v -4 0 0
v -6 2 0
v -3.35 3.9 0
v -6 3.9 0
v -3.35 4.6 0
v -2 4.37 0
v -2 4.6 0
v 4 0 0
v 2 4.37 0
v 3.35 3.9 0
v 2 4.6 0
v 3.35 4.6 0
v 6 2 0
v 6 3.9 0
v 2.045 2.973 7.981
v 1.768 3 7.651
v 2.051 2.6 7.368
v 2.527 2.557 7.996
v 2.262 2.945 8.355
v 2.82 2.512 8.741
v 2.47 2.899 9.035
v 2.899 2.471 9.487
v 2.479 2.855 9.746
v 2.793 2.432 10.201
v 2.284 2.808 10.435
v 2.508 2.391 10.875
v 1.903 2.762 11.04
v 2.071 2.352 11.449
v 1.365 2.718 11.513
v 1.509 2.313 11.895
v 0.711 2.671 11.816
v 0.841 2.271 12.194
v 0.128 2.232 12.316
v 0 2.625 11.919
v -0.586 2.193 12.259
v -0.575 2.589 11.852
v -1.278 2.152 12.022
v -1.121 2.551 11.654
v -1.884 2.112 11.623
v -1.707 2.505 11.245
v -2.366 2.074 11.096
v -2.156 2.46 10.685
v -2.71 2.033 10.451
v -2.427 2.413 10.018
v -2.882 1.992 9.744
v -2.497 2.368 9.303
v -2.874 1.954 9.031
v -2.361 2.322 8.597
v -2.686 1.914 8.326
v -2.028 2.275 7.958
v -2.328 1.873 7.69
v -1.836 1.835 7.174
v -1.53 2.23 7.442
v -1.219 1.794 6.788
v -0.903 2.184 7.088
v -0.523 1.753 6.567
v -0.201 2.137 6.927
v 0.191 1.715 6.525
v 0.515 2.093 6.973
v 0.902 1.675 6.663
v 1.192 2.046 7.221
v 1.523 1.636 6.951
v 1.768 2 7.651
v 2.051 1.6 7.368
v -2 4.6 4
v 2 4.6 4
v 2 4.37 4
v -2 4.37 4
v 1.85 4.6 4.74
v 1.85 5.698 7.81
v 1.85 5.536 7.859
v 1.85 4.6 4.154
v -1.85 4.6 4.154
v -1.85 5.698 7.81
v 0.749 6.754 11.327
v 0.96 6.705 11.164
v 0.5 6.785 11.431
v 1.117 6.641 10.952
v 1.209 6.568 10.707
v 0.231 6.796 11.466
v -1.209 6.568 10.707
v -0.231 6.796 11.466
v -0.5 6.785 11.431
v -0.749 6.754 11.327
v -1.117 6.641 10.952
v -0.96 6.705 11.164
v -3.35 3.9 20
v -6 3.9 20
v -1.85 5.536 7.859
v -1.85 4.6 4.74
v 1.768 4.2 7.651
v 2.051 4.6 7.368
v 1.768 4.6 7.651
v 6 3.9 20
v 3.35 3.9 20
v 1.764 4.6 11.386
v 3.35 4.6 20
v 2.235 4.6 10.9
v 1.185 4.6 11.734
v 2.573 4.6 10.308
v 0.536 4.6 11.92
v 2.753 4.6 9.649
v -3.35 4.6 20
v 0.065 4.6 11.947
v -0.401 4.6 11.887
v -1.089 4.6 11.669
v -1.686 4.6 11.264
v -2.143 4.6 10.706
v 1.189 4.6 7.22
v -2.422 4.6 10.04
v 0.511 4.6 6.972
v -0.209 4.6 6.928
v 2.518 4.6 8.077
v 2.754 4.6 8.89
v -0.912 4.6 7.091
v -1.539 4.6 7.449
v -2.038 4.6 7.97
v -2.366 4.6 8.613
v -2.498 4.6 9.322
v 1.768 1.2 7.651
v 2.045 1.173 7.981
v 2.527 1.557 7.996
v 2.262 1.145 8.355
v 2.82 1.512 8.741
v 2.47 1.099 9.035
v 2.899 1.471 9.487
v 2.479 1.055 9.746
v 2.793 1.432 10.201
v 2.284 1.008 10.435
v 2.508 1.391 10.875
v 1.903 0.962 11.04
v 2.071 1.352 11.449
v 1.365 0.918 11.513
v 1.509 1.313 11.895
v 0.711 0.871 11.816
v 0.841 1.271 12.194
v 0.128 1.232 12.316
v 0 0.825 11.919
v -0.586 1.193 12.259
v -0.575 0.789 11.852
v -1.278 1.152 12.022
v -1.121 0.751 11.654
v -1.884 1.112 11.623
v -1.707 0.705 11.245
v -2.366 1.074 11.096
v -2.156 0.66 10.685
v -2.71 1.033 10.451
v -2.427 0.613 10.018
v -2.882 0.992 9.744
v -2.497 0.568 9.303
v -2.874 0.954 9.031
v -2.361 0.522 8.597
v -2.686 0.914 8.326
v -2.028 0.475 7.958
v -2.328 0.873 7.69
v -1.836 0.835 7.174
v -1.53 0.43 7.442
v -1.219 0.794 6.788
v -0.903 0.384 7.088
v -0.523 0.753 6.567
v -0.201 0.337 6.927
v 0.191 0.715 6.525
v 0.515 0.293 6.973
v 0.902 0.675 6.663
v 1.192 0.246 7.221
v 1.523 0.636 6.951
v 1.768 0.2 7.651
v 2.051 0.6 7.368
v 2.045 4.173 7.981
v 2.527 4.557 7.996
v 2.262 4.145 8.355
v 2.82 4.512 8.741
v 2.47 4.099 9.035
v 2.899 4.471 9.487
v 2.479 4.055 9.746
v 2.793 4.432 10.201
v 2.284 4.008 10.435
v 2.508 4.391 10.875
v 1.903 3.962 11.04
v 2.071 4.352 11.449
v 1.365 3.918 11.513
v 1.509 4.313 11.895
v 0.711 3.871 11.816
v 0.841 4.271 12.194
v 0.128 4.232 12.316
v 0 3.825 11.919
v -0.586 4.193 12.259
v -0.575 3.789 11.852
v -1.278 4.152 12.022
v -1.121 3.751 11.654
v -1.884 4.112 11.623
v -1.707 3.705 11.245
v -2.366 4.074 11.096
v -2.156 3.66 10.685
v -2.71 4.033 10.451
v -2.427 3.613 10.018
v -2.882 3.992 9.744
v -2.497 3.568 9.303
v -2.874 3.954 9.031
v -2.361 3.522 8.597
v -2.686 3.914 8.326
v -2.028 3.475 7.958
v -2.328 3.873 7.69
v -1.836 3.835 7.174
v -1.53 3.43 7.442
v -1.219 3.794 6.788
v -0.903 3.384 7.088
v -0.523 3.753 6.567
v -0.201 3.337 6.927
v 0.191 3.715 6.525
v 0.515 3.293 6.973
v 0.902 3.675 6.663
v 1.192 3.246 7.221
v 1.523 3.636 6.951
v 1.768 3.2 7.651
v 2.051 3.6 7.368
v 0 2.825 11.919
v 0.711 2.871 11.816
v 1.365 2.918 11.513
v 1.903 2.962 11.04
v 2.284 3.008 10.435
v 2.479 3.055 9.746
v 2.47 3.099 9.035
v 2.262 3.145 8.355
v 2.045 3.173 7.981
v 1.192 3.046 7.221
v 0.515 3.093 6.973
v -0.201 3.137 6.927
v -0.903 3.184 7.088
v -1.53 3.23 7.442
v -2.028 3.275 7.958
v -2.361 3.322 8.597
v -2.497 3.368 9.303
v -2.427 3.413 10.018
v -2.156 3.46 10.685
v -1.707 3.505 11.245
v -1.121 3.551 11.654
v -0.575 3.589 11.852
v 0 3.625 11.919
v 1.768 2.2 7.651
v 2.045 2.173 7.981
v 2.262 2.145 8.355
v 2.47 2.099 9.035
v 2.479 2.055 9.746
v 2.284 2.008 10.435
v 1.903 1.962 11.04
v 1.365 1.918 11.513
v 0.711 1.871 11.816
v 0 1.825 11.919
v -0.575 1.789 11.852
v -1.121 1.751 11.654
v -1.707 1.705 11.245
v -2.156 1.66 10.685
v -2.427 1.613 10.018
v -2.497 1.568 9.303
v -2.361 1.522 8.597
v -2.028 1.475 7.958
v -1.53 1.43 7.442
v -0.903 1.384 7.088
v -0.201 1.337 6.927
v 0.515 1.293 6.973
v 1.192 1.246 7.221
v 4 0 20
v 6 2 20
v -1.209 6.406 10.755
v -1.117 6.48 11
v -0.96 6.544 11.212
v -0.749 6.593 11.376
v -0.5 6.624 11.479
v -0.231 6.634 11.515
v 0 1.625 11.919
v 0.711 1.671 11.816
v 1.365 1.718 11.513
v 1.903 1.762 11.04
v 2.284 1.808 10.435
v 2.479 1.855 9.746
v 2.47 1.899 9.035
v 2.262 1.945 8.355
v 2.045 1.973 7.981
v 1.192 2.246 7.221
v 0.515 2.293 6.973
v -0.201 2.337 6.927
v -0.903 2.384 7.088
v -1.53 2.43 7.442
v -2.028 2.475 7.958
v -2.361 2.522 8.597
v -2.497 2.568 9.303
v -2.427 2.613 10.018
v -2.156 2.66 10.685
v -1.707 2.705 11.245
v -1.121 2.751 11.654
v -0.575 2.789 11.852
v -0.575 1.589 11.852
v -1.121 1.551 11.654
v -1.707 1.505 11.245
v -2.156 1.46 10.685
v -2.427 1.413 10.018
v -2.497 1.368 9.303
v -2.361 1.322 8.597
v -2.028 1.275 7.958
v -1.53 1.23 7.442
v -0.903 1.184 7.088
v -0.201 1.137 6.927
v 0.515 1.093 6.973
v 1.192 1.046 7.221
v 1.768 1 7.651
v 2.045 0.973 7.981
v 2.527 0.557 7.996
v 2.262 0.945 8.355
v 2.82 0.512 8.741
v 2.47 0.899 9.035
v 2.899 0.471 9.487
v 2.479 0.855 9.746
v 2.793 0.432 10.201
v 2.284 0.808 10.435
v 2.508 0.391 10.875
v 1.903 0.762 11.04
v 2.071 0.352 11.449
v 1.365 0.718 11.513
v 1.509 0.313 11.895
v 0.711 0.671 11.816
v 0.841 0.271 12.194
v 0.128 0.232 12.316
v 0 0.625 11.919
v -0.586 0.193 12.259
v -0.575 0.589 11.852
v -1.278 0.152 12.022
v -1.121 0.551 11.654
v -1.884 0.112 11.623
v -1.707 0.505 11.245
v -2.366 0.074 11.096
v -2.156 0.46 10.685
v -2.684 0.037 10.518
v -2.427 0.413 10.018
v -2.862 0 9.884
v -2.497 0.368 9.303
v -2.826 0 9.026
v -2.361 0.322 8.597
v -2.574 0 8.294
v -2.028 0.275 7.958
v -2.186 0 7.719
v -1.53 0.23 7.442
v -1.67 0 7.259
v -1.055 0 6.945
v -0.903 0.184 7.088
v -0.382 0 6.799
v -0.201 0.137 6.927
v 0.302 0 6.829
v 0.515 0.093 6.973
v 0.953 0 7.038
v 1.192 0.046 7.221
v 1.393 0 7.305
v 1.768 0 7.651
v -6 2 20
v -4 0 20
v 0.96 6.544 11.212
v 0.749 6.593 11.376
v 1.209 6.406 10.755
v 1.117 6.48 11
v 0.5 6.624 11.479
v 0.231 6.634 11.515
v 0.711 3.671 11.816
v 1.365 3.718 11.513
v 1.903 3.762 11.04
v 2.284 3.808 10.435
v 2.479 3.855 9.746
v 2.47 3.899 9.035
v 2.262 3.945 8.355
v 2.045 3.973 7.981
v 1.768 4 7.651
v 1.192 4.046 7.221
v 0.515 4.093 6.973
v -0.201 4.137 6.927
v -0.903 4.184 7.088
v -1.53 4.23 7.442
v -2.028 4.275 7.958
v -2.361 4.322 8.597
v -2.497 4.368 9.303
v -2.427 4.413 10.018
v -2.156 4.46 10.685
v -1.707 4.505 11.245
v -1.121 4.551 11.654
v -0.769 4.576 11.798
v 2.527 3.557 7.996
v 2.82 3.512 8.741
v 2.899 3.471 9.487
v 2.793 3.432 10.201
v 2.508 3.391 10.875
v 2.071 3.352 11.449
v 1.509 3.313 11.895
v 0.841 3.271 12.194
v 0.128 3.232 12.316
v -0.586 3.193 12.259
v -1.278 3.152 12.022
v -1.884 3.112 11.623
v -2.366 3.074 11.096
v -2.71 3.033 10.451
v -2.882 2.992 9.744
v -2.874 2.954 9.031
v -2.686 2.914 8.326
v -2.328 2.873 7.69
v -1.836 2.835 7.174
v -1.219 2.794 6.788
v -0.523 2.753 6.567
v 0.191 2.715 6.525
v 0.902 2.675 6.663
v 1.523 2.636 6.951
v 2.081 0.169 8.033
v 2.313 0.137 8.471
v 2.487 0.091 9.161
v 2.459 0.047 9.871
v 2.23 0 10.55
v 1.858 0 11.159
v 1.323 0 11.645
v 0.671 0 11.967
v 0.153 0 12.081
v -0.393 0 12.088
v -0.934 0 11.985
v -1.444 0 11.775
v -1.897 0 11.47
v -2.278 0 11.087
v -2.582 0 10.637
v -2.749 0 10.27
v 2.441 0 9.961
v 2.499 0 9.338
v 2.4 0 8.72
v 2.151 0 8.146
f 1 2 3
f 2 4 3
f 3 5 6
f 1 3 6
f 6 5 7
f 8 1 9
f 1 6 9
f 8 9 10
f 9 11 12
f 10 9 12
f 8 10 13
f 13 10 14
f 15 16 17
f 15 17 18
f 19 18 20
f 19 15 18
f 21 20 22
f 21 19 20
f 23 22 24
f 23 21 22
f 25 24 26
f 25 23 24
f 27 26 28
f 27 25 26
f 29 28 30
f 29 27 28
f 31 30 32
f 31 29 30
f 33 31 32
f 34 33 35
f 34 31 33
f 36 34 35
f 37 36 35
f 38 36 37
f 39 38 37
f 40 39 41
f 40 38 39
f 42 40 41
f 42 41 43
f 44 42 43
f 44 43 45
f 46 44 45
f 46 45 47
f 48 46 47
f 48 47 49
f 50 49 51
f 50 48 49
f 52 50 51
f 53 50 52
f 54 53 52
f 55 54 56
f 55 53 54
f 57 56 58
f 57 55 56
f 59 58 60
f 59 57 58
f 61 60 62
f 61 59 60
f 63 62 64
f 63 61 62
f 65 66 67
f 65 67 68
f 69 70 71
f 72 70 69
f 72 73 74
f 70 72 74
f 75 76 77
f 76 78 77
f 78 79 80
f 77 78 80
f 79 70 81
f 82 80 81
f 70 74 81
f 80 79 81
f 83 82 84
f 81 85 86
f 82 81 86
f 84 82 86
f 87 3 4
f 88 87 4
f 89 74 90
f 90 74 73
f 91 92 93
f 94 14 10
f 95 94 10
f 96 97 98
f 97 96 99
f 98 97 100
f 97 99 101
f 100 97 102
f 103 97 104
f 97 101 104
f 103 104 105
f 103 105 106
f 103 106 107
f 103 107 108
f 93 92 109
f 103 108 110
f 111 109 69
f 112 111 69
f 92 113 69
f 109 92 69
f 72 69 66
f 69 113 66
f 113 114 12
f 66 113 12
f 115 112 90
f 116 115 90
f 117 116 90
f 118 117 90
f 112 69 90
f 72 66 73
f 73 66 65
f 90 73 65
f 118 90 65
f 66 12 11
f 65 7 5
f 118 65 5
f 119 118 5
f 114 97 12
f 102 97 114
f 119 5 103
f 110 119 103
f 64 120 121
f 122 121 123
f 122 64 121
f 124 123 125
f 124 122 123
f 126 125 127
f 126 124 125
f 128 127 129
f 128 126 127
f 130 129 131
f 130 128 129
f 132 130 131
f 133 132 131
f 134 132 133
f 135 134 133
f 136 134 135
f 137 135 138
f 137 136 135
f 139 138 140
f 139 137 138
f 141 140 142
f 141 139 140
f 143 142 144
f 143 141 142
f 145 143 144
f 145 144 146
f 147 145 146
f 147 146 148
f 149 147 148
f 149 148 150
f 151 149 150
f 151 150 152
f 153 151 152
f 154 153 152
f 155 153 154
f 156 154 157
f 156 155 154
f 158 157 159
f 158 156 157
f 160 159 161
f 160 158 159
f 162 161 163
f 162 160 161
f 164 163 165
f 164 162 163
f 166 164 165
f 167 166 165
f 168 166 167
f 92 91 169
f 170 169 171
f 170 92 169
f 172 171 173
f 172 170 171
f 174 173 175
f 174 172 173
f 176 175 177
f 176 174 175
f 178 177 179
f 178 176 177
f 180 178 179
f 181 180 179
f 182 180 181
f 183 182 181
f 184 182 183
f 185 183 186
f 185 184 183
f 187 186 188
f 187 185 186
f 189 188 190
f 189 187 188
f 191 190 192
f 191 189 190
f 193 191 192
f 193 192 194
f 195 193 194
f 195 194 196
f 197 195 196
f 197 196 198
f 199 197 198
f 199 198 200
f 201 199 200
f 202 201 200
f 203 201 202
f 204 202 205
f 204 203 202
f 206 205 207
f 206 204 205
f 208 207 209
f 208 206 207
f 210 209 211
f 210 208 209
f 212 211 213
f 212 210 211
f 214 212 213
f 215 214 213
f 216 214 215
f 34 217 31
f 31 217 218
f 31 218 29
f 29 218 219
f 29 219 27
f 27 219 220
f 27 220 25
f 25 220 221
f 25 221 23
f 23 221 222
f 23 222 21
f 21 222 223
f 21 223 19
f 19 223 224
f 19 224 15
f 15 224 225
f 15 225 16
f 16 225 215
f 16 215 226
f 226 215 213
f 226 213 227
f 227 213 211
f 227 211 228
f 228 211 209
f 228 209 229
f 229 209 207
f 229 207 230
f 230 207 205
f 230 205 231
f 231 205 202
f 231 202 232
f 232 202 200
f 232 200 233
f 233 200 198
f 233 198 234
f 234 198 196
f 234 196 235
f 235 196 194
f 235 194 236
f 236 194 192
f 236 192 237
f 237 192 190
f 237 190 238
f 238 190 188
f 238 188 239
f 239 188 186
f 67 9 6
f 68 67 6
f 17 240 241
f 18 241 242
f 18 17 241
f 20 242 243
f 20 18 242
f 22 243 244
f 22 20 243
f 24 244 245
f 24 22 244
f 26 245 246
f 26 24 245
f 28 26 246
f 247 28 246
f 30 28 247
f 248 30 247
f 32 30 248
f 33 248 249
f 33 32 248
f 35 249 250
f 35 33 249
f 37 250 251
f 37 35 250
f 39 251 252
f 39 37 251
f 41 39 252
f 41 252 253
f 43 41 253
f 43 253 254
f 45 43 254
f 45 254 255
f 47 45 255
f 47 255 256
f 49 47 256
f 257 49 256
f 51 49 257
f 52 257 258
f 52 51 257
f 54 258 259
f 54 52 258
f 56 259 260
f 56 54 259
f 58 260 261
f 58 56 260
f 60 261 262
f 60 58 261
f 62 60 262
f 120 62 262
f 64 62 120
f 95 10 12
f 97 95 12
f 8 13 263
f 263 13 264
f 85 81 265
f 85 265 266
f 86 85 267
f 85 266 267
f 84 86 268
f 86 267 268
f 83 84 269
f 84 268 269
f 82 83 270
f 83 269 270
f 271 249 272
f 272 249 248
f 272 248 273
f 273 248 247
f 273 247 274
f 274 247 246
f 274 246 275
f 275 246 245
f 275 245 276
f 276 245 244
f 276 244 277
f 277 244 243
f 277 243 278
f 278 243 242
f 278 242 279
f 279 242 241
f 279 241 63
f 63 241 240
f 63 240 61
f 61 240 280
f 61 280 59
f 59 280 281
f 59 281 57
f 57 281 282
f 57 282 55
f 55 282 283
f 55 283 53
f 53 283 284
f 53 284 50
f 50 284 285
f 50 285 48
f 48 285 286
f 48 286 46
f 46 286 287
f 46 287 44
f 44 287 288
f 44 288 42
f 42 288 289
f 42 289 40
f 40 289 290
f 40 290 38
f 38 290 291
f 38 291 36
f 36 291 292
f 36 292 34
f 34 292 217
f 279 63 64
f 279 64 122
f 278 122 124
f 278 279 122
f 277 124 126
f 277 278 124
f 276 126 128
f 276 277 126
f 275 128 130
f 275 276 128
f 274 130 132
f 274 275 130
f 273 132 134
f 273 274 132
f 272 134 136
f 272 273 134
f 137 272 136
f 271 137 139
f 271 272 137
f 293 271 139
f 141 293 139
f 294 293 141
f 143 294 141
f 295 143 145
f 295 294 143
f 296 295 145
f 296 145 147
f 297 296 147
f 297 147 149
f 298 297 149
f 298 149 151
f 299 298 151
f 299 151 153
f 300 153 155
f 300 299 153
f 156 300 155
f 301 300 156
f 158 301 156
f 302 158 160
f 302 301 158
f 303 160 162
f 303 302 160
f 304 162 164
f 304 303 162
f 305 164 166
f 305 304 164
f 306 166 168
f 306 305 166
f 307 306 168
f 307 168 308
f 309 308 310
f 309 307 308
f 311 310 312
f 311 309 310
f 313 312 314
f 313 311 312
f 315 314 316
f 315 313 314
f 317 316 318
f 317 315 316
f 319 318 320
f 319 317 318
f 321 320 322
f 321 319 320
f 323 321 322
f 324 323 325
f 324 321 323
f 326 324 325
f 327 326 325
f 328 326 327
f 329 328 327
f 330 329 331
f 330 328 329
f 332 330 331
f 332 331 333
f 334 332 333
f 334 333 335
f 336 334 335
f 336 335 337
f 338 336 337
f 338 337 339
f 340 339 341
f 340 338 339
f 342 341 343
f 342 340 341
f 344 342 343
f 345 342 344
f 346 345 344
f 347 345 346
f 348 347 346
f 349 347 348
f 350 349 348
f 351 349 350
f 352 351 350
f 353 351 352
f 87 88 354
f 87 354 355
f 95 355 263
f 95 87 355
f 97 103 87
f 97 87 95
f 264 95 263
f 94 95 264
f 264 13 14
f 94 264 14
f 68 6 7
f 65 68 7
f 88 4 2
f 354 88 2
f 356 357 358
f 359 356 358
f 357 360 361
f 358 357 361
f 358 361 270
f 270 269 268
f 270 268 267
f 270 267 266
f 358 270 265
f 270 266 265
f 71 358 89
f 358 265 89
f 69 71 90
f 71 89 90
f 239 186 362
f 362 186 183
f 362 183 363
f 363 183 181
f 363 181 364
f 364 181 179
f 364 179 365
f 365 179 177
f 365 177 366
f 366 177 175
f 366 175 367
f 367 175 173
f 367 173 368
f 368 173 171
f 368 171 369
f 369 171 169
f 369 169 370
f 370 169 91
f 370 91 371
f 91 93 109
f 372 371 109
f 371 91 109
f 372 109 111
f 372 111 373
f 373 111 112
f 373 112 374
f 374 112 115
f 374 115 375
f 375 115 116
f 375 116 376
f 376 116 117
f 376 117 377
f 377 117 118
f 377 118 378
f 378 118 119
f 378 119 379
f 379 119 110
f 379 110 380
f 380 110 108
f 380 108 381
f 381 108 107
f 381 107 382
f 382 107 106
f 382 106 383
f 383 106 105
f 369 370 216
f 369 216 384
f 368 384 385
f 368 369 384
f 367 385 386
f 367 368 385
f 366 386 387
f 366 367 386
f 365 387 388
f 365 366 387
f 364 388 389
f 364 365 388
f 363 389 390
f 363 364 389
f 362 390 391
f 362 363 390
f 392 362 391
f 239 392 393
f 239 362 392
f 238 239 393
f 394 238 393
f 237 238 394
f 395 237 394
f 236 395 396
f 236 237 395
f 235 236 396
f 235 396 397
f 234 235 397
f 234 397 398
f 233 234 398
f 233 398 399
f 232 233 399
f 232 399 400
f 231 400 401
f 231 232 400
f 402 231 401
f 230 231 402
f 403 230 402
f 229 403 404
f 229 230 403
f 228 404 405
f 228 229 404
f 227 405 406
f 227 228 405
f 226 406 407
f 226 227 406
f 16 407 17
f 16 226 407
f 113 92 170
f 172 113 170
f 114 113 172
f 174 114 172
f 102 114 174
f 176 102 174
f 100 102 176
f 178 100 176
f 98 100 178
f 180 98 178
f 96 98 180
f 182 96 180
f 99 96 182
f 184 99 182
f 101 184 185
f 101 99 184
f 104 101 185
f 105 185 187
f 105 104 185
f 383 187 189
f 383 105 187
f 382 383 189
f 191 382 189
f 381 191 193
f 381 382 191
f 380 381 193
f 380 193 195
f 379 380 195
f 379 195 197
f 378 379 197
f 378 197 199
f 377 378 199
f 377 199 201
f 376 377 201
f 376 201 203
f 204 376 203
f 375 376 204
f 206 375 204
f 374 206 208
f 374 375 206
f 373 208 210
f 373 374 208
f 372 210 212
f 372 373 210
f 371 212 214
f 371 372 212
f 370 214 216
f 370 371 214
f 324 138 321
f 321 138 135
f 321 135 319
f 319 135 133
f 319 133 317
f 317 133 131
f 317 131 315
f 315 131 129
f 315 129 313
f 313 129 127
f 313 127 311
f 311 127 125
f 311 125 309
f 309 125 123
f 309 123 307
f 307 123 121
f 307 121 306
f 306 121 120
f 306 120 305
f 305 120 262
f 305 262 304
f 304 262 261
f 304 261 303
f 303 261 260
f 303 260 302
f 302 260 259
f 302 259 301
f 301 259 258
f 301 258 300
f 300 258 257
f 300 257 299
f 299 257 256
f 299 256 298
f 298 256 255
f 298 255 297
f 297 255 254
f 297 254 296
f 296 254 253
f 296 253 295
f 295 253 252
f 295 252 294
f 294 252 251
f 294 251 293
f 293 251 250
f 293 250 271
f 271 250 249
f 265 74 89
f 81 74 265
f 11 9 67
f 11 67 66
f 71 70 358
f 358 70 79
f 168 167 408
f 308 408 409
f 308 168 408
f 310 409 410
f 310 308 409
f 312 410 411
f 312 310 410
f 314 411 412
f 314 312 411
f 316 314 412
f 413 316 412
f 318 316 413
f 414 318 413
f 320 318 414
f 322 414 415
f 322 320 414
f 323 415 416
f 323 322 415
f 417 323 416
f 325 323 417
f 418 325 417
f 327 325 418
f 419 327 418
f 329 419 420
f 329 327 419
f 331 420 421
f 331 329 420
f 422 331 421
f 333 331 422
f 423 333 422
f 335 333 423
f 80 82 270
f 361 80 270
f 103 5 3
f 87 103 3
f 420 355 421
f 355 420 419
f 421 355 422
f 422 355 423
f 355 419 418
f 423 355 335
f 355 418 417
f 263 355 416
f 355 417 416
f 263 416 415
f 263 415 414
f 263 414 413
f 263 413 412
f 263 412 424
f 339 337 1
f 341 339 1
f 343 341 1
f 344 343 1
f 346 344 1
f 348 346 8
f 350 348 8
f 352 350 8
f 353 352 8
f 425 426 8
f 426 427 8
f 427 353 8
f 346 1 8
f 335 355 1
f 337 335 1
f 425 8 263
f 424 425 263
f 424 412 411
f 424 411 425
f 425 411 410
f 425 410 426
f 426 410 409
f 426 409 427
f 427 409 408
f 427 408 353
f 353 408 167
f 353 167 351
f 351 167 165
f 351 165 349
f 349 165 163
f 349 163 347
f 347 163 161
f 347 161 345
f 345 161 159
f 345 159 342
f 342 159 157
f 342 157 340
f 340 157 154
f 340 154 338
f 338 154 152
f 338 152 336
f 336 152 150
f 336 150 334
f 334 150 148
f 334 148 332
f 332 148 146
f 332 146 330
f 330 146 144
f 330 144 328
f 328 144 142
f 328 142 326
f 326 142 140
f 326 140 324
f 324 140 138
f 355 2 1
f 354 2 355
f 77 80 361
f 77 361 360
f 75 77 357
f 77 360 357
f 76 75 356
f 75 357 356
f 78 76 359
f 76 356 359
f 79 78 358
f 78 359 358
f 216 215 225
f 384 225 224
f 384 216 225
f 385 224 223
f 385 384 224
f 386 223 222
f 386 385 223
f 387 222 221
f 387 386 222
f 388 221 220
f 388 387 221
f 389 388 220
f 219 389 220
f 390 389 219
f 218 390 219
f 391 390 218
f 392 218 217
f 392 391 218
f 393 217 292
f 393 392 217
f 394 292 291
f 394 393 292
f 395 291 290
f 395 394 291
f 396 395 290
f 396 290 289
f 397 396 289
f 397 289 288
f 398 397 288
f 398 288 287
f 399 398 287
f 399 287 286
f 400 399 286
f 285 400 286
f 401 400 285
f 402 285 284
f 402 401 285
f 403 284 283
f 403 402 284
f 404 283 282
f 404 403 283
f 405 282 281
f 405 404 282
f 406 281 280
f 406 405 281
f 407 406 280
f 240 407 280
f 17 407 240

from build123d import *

# Parameters (mm, degrees)
EXTRUDE_1_DEPTH      = 20
CHAMFER_1_SIZE       = 2
SKETCH_2_R           = 2.5
CUT_EXTRUDE_1_DEPTH  = 22.381300241
SWEEP_1_PITCH        = 1
SKETCH_6_W           = 4
SKETCH_6_H           = 0.46098281
CUT_EXTRUDE_2_DEPTH  = 4
EXTRUDE_2_DEPTH      = 1.85
EXTRUDE_2_DEPTH_BACK = 1.85
CUT_EXTRUDE_3_DEPTH  = 1.85
FILLET_1_R           = 1


with BuildPart() as part:
    # 草图1 → 凸台-拉伸1 (new body)
    with BuildSketch(Plane.XY):
        Polygon((-6, 0), (6, 0), (6, 3.9), (3.35, 3.9), (3.35, 4.6), (-3.35, 4.6), (-3.35, 3.9), (-6, 3.9), align=None)
    extrude(amount=EXTRUDE_1_DEPTH)

    # 倒角1
    chamfer_1_edges = [part.edges().sort_by_distance(p)[0] for p in [
        (6, 0, 10),
        (-6, 0, 10),
    ]]
    chamfer(chamfer_1_edges, length=CHAMFER_1_SIZE)

    # 草图2 → 切除-拉伸1 (cut, through all)
    with BuildSketch(Plane(origin=(0, 4.6, 0), x_dir=(1, 0, 0), z_dir=(0, 1, 0))):
        with Locations(Location((0, -9.419001614, 0), (0, 0, 270))):
            Circle(SKETCH_2_R)
    extrude(amount=-CUT_EXTRUDE_1_DEPTH, mode=Mode.SUBTRACT)

    # 切除-扫描1: arcs per turn and ends read off the stored shape
    # 切除-扫描1: the profile of 草图5 profile screwed along a right-hand helix through 5 turns, 8 arcs to a turn; built about Z, then put on its axis
    sweep_1_z = Axis((0, 0, 0), (0, 0, 1))
    sweep_1_corners = [(2.4997, 0, -0.4003), (2.4997, 0, 0.4003), (2.9, 0, 0)]
    with BuildLine(mode=Mode.PRIVATE) as sweep_1_profile:
        Line(sweep_1_corners[0], sweep_1_corners[1])
        Line(sweep_1_corners[1], sweep_1_corners[2])
        Line(sweep_1_corners[2], sweep_1_corners[0])
    sweep_1_cap = Face(sweep_1_profile.wire())
    sweep_1_turn_angles = [0, 22.5, 45, 67.5, 90, 112.5, 135, 157.5, 180, 202.5, 225, 247.5, 270, 292.5, 315, 337.5, 360]
    sweep_1_turn_weights = [1, 0.9238795325112867, 1, 0.9238795325112867, 1, 0.9238795325112867, 1, 0.9238795325112867, 1, 0.9238795325112867, 1, 0.9238795325112867, 1, 0.9238795325112867, 1, 0.9238795325112867, 1]
    sweep_1_turn_rails = [Edge.make_bspline([Vector(p[0], p[1], 0).rotate(sweep_1_z, sweep_1_turn_angles[k]) / sweep_1_turn_weights[k] + Vector(0, 0, p[2] + SWEEP_1_PITCH * sweep_1_turn_angles[k] / 360) for k in range(17)], [0, 0, 0, 1, 1, 2, 2, 3, 3, 4, 4, 5, 5, 6, 6, 7, 7, 8, 8, 8], 2, sweep_1_turn_weights) for p in sweep_1_corners]
    sweep_1_turn_sides = [Face.make_surface_from_curves(sweep_1_turn_rails[p[0]], sweep_1_turn_rails[p[1]]) for p in [(0, 1), (1, 2), (2, 0)]]
    sweep_1 = Plane(origin=(0, 4.6, 9.419001614), x_dir=(0.7071067811865438, 0, -0.7071067811865513), z_dir=(0, -1, 0)) * Solid(Shell([*[p.moved(Location((0, 0, SWEEP_1_PITCH * i))) for i in range(5) for p in sweep_1_turn_sides], sweep_1_cap, sweep_1_cap.rotate(sweep_1_z, 1800).moved(Location((0, 0, SWEEP_1_PITCH * 1800 / 360)))]))
    add(sweep_1, mode=Mode.SUBTRACT)

    # 草图6 → 切除-拉伸2 (cut)
    with BuildSketch(Plane(origin=(0, 0, 0), x_dir=(-1, 0, 0), z_dir=(0, 0, -1))):
        with Locations((0, 4.6)):
            Rectangle(SKETCH_6_W, SKETCH_6_H)
    extrude(amount=-CUT_EXTRUDE_2_DEPTH, mode=Mode.SUBTRACT)

    # 草图7 → 凸台-拉伸2 (add, two sides: drawn at the far end of the back side and taken through both)
    with BuildSketch(Plane(origin=(0, 0, 0), x_dir=(0, 0, -1), z_dir=(1, 0, 0)).offset(-EXTRUDE_2_DEPTH_BACK)):
        Polygon((-4.154281608, 4.6), (-11.466055335, 6.795870295), (-11.514546749, 6.63440436), (-4.740419706, 4.6), align=None)
    extrude(amount=EXTRUDE_2_DEPTH + EXTRUDE_2_DEPTH_BACK)

    # 草图8 → 切除-拉伸3 (cut)
    with BuildSketch(Plane(origin=(0, 3.075042872, -0.923496206), x_dir=(1, 0, 0), z_dir=(0, 0.9577419497796025, -0.2876288539635158))):
        Polygon((-1.85, -9.119016537), (-1.041199164, -12.936210577), (-1.85, -12.936210577), align=None)
    cut_extrude_3 = extrude(amount=-CUT_EXTRUDE_3_DEPTH, mode=Mode.SUBTRACT)

    # 镜向1: 切除-拉伸3 across plane
    add(cut_extrude_3.mirror(Plane(origin=(0, 0, 0), x_dir=(0, 0, 1), z_dir=(1, 0, 0))), mode=Mode.SUBTRACT)

    # 圆角1
    fillet_1_edges = [part.edges().sort_by_distance(p)[0] for p in [
        (-1.041199164, 6.715137327, 11.490301042),
        (1.041199164, 6.715137327, 11.490301042),
    ]]
    fillet(fillet_1_edges, radius=FILLET_1_R)


solid = part.part
